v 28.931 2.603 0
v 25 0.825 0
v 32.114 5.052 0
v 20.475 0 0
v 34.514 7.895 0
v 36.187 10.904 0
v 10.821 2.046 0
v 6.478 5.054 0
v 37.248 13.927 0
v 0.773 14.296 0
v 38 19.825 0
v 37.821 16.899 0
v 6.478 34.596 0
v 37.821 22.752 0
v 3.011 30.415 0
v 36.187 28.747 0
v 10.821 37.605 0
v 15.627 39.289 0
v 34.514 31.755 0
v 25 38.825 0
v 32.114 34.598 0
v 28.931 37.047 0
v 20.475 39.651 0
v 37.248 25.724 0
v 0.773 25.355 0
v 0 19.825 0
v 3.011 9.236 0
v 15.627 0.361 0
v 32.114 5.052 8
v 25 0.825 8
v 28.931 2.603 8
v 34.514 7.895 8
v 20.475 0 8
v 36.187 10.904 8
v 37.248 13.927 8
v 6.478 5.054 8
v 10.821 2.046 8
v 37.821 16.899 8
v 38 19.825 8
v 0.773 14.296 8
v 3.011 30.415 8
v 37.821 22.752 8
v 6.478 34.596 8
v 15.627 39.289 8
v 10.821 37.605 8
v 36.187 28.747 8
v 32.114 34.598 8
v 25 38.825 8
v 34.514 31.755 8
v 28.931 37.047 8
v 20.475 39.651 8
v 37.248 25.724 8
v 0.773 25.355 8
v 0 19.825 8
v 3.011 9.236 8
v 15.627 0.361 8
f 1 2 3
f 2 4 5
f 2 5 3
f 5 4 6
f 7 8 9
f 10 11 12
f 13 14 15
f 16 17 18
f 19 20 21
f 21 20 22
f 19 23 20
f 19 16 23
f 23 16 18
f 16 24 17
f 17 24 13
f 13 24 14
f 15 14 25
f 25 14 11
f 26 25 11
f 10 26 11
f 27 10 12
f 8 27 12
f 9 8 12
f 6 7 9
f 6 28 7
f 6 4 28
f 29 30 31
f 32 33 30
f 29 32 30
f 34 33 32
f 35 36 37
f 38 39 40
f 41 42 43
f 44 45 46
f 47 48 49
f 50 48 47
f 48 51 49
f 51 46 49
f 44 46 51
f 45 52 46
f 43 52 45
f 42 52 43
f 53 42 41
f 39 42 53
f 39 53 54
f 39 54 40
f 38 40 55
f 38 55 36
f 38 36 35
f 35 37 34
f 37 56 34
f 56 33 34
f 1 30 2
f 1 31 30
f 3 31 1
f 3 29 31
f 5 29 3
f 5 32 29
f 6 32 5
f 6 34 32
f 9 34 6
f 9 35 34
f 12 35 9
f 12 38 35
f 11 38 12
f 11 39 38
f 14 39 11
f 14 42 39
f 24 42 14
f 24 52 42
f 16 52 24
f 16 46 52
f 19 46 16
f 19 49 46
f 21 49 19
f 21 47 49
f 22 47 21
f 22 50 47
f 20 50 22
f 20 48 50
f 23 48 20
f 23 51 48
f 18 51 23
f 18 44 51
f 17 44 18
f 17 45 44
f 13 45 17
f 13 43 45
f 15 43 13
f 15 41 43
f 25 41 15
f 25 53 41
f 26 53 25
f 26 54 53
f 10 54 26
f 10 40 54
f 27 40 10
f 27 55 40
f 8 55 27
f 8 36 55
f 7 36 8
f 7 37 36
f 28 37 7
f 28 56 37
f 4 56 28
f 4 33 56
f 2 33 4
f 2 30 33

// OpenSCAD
$fn = 32;

// ----------------------------------------------------------------------
// Cam disc: base radius 13.0 mm, lift 12.0 mm, 28 profile points
// ----------------------------------------------------------------------

// --- parameters (mm) ---
profile_height = 8;       // extrusion height
profile_points = 28;      // points of the closed outline

profile = [[38, 19.825], [37.821, 22.752], [37.248, 25.724], [36.187, 28.747], [34.514, 31.755], [32.114, 34.598], [28.931, 37.047], [25, 38.825], [20.475, 39.651], [15.627, 39.289], [10.821, 37.605], [6.478, 34.596], [3.011, 30.415], [0.773, 25.355], [0, 19.825], [0.773, 14.296], [3.011, 9.236], [6.478, 5.054], [10.821, 2.046], [15.627, 0.361], [20.475, 0], [25, 0.825], [28.931, 2.603], [32.114, 5.052], [34.514, 7.895], [36.187, 10.904], [37.248, 13.927], [37.821, 16.899]];  // single closed polygon, 28 points, counter clockwise

// --- the one profile operation ---
linear_extrude(height = profile_height) polygon(points = profile);
